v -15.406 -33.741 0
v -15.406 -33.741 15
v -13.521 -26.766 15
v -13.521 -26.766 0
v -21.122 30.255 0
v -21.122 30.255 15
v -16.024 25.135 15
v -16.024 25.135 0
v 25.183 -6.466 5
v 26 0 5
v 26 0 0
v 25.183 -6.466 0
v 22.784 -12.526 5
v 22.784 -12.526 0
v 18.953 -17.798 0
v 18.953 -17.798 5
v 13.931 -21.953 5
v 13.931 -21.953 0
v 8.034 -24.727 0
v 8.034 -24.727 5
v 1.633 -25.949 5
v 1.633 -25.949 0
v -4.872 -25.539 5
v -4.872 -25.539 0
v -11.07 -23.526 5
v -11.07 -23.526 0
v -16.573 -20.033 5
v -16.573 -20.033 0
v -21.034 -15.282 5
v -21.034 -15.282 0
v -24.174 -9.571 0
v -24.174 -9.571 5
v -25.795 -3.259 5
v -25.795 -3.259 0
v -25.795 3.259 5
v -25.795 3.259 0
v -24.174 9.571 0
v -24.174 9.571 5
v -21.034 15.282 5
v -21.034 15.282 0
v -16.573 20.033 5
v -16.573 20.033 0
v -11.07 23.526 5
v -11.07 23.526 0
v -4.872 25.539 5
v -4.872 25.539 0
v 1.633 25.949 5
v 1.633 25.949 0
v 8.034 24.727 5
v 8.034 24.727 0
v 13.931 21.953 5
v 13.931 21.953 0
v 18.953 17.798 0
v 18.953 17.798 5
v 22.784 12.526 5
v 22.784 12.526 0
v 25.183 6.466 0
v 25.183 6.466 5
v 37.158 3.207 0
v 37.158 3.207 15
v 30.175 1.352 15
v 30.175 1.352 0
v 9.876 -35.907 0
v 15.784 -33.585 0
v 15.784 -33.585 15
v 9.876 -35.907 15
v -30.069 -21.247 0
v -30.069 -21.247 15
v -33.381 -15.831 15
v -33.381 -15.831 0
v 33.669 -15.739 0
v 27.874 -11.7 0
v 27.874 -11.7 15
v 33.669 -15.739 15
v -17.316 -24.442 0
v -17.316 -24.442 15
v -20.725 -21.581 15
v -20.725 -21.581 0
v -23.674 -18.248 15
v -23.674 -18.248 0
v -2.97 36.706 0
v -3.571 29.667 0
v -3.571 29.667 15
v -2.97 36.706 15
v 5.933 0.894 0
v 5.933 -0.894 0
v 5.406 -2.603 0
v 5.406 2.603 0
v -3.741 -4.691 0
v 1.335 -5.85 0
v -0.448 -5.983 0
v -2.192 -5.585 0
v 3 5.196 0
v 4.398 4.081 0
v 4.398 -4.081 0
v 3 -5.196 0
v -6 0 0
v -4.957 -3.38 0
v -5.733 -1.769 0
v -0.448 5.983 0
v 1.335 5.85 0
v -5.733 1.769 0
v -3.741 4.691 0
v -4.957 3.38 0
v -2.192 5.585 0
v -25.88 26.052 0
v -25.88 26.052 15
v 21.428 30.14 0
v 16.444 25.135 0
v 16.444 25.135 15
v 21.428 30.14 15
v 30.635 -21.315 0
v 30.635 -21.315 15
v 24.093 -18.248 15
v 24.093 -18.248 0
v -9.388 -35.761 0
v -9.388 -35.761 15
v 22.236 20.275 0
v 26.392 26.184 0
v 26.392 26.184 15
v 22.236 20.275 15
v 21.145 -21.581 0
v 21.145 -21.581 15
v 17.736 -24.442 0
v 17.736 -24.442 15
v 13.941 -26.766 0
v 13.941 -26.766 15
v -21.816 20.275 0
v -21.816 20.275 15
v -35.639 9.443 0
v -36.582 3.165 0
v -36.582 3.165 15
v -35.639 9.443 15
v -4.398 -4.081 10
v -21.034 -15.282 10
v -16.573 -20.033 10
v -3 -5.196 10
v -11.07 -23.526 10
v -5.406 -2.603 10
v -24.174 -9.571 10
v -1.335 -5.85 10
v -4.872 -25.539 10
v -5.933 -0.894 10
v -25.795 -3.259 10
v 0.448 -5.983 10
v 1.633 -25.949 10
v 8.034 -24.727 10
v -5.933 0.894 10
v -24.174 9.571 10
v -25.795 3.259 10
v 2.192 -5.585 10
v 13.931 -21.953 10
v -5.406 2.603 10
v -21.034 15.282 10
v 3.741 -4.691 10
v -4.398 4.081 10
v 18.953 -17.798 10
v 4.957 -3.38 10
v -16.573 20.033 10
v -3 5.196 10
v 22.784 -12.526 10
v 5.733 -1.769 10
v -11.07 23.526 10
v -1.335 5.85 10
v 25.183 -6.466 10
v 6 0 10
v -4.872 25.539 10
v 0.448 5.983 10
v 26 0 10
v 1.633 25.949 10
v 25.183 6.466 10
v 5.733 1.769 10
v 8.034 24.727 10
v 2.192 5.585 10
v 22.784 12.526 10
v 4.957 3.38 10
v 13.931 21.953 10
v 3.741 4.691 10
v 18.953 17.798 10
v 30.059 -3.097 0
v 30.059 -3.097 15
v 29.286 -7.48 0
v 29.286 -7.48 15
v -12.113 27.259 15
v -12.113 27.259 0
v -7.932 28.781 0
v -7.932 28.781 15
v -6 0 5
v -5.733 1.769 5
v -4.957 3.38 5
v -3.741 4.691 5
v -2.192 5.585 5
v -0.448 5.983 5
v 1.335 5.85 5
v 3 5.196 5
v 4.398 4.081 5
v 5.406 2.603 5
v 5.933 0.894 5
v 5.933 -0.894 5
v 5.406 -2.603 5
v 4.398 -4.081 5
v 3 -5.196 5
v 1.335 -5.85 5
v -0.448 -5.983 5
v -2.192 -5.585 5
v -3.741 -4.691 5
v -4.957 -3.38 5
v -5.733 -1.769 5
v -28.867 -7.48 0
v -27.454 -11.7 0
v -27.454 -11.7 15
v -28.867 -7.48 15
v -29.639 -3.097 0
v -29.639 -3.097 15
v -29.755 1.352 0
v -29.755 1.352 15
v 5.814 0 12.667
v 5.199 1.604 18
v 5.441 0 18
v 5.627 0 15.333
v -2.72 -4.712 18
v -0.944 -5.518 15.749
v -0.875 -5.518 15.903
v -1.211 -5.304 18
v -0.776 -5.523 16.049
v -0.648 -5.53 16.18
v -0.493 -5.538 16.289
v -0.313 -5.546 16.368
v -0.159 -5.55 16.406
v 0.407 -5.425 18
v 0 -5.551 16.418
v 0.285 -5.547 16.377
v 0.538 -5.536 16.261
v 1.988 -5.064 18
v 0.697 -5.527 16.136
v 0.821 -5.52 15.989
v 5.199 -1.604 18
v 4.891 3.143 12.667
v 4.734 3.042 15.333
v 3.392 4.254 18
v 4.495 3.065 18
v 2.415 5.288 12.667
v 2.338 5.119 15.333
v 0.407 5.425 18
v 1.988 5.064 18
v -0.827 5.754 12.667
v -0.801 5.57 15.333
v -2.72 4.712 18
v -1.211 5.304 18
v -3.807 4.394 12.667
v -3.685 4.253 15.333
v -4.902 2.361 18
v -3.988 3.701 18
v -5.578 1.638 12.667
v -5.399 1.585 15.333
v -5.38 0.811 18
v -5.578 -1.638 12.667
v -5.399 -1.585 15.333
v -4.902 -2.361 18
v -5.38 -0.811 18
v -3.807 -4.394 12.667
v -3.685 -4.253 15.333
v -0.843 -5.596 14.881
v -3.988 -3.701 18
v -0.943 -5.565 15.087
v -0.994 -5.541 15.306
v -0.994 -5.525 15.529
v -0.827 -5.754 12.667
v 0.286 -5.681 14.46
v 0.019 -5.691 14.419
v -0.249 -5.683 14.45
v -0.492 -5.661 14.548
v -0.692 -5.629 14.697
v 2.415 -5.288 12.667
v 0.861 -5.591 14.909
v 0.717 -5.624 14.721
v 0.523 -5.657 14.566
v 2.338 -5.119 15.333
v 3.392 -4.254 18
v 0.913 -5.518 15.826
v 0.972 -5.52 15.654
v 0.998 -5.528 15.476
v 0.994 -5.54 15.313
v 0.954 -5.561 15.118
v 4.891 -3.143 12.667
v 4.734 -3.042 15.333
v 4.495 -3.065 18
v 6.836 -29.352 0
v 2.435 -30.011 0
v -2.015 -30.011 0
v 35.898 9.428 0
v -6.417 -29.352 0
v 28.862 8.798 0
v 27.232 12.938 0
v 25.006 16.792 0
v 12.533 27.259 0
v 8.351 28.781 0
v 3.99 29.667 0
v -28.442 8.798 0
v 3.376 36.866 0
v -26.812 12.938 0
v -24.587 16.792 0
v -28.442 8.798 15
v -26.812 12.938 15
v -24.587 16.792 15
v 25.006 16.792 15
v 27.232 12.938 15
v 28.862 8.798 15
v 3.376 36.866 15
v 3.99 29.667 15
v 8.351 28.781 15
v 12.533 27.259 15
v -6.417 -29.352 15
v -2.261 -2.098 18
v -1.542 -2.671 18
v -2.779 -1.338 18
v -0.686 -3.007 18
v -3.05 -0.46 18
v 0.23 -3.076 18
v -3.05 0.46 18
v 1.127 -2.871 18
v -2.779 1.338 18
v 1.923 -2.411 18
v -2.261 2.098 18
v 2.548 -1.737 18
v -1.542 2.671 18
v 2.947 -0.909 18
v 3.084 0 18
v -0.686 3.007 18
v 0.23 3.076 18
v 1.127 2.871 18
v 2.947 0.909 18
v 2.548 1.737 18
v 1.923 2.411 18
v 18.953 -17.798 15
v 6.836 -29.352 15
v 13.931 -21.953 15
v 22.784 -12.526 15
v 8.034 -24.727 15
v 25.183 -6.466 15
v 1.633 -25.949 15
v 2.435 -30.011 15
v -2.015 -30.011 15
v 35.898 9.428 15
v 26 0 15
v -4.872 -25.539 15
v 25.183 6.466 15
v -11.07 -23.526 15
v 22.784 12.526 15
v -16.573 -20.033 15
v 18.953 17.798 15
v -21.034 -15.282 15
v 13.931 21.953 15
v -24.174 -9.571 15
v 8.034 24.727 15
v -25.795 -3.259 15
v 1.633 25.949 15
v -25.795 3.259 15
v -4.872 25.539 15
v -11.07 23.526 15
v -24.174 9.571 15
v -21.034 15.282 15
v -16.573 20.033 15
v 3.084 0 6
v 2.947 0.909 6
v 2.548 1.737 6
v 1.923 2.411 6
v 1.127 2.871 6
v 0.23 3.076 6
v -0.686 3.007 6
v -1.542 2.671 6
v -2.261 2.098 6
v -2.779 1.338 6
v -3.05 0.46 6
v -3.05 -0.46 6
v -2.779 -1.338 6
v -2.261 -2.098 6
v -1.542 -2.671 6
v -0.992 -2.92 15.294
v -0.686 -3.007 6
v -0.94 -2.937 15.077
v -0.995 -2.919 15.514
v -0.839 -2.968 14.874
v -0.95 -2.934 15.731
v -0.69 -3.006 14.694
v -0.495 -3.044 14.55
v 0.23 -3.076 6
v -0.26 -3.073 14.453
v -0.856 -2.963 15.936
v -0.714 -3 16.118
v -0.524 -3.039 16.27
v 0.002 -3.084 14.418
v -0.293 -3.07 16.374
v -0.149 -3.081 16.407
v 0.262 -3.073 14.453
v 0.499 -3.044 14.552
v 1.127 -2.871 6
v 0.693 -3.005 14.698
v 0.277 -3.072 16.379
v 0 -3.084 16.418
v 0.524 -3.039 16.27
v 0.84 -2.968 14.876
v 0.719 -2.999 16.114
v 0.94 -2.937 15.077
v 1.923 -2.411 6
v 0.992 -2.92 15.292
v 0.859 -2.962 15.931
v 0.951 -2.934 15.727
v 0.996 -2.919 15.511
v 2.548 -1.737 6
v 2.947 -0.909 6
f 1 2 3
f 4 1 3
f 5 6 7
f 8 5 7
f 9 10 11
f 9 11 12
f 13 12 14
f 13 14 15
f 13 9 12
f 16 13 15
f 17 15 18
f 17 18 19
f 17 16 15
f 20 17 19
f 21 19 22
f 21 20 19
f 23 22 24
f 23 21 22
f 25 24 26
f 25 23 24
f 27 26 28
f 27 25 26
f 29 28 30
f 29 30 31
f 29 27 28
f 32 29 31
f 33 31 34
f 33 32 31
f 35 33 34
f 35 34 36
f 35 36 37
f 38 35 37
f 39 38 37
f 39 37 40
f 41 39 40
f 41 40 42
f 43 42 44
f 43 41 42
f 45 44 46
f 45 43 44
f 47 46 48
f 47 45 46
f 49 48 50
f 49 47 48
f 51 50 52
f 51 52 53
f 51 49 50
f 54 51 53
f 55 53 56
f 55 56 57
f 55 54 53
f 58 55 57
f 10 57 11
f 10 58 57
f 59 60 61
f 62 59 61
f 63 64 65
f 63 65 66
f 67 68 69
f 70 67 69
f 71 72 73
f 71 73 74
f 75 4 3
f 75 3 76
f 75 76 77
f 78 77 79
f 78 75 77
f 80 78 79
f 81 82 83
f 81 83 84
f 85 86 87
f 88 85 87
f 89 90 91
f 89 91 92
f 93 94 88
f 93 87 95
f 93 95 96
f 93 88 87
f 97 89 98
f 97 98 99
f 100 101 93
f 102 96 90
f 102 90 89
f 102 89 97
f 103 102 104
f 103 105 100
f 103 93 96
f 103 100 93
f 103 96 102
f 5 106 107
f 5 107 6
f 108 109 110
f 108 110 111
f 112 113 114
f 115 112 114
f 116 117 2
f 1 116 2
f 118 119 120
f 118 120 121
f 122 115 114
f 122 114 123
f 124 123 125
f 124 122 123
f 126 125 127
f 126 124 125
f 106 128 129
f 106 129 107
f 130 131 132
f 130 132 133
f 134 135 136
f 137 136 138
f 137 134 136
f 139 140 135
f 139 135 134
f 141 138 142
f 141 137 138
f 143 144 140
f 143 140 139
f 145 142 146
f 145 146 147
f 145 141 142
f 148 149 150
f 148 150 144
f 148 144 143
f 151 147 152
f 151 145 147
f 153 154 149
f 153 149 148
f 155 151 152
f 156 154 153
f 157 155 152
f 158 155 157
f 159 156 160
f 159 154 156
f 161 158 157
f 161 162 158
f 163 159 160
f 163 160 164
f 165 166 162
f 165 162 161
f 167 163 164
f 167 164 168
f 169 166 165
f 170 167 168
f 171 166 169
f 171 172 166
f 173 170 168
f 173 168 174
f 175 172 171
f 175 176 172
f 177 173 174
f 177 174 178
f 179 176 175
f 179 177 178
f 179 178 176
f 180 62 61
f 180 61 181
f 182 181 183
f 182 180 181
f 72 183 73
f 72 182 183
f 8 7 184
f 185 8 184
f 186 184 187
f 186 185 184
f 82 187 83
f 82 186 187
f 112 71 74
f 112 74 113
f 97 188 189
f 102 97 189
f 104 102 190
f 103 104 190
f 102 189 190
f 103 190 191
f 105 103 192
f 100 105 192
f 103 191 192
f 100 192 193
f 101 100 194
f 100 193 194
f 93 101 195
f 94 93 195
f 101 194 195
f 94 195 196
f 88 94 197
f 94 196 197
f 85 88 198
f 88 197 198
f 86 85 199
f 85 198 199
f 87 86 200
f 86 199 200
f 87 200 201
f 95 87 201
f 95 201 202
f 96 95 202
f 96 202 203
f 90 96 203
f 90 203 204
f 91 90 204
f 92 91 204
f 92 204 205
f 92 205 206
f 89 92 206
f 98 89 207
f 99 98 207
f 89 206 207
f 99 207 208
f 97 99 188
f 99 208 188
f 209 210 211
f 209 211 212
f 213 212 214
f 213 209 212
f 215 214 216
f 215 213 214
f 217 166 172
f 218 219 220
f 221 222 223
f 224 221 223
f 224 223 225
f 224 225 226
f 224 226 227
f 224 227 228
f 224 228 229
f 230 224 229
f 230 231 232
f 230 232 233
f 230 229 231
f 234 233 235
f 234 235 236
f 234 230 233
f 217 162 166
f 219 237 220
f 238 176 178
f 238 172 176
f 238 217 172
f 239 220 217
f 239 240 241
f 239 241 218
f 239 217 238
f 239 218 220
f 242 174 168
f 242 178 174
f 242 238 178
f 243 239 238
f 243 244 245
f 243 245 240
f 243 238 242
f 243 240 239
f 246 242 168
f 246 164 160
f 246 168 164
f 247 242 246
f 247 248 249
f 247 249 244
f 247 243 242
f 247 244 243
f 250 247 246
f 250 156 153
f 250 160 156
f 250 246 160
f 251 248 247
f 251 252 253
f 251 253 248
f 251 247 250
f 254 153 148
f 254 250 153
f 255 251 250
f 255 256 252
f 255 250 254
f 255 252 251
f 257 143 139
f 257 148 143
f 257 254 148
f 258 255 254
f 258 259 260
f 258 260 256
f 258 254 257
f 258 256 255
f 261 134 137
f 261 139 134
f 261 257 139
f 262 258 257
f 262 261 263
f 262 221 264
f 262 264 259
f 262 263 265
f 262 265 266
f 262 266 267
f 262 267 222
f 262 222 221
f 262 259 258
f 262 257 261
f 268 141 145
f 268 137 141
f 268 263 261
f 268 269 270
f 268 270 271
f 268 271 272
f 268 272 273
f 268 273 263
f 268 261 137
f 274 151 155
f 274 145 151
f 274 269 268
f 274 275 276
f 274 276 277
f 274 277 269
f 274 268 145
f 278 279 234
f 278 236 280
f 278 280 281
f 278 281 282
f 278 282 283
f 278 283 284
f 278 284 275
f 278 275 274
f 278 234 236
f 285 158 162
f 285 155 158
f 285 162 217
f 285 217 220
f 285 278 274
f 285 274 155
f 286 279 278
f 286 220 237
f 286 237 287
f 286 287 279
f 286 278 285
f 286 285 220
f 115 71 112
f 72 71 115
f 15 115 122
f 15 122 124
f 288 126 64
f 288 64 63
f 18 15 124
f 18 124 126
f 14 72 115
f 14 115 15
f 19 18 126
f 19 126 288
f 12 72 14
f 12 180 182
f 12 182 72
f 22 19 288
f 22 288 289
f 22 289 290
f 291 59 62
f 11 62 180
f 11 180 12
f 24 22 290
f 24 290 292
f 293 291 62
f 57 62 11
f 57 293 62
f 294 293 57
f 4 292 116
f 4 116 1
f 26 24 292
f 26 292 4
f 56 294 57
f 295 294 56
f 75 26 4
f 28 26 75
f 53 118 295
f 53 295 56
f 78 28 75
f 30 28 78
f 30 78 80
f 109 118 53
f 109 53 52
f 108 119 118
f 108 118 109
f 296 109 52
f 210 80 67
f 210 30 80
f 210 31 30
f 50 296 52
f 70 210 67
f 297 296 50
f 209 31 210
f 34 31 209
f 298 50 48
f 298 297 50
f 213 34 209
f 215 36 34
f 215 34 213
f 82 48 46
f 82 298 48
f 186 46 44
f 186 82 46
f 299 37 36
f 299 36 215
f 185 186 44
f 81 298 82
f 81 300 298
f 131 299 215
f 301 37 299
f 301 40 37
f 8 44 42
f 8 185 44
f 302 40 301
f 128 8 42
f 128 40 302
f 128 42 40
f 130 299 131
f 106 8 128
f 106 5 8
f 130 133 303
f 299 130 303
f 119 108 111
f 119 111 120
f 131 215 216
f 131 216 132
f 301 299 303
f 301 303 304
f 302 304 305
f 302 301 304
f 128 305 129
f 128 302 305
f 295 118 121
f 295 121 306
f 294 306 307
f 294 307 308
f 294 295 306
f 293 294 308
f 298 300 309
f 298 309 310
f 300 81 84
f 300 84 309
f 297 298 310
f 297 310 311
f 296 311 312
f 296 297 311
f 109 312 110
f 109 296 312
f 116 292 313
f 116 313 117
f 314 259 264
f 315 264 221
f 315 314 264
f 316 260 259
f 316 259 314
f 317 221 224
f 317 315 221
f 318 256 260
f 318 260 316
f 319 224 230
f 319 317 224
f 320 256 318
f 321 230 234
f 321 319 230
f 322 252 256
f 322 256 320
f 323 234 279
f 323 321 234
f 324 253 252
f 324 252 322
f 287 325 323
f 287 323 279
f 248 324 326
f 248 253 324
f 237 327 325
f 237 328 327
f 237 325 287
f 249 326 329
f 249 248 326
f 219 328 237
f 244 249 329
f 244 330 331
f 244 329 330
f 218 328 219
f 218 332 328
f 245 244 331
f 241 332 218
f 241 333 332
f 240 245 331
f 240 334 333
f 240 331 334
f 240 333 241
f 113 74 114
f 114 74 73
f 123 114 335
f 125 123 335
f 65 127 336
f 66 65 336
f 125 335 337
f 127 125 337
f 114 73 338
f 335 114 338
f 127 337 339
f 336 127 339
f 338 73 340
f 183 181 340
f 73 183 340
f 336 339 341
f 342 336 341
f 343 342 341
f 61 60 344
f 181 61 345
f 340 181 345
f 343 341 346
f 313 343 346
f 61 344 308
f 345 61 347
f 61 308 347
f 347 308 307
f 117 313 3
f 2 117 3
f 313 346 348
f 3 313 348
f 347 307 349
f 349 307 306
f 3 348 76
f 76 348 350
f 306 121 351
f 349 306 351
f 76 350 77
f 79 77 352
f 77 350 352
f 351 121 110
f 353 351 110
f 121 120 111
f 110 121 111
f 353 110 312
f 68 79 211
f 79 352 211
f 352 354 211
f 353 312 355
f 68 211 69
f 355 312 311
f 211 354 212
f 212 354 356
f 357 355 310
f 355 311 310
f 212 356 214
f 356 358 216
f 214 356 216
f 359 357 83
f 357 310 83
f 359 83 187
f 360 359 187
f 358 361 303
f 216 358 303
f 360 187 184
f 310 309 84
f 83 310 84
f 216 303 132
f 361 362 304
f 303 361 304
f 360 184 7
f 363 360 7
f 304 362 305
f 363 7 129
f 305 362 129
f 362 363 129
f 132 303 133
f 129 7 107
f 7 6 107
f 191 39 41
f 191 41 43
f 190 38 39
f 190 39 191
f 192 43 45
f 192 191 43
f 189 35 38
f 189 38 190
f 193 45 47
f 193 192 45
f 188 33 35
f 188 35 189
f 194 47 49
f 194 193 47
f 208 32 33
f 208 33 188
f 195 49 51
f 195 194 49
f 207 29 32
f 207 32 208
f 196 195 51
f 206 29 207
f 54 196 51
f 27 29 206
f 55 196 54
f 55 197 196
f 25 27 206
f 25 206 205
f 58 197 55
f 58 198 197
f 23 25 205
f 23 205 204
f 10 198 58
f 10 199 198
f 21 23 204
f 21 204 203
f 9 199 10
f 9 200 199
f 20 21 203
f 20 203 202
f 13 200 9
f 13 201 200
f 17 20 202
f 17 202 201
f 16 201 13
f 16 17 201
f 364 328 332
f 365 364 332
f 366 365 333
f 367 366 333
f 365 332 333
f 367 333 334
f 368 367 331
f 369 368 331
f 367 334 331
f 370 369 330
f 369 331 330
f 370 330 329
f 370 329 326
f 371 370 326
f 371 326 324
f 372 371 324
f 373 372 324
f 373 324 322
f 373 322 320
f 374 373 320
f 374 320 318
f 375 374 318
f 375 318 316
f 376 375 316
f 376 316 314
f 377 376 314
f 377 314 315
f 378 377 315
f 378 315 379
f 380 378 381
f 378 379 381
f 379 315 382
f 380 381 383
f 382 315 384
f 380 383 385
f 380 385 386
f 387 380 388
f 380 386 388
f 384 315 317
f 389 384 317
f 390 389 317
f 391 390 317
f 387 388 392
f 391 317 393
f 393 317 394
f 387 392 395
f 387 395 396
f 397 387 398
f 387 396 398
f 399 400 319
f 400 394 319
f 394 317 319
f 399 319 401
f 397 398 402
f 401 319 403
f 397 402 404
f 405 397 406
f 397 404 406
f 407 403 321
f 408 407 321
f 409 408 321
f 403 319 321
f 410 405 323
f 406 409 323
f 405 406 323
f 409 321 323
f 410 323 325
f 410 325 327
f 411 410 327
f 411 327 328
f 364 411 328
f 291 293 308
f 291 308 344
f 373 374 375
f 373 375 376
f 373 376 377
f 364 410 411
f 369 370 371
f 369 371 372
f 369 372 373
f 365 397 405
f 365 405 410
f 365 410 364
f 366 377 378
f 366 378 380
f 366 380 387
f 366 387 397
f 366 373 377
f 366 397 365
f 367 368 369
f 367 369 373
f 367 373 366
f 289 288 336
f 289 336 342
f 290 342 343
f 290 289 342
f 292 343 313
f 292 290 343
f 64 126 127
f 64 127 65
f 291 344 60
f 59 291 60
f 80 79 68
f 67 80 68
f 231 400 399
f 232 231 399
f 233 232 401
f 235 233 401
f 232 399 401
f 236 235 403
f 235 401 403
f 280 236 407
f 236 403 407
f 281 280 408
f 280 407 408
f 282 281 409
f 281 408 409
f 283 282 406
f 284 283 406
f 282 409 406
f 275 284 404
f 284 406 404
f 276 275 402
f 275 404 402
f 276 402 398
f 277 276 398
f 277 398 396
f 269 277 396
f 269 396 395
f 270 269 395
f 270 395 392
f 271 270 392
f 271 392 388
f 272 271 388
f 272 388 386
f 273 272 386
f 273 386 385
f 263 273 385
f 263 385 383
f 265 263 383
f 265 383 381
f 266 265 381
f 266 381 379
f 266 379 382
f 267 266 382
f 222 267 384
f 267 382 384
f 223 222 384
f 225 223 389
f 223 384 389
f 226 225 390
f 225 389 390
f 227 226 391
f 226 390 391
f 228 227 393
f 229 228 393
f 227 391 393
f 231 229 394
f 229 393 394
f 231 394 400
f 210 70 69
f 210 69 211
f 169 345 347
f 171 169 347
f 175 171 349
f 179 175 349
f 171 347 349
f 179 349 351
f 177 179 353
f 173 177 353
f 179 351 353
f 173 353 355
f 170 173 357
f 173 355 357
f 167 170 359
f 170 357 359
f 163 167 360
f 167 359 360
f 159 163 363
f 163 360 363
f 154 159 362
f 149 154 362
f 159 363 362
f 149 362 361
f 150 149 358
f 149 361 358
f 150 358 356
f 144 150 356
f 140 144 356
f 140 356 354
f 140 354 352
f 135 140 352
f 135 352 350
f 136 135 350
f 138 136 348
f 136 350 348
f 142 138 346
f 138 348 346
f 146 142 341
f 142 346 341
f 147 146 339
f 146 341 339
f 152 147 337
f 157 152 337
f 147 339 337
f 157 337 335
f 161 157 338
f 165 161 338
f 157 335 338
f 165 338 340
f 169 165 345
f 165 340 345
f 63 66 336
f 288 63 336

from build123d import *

# Parameters (mm, degrees)
BOSS_EXTRUDE1_DEPTH = 15
SKETCH3_R           = 26
CUT_EXTRUDE1_DEPTH  = 5
CUT_EXTRUDE2_START  = -5
SKETCH4_R           = 26
CUT_EXTRUDE2_DEPTH  = 5
SKETCH5_R           = 6
BOSS_EXTRUDE2_DEPTH = 8
BOSS_EXTRUDE2_TAPER = 4
SKETCH6_R           = 6
BOSS_EXTRUDE3_DEPTH = 5
SKETCH7_R           = 3.084221082
CUT_EXTRUDE3_DEPTH  = 12
CUT_EXTRUDE4_REACH  = 57.352
SKETCH8_R           = 1


with BuildPart() as part:
    # Sketch1 → Boss-Extrude1 (new body)
    with BuildSketch(Plane.XY):
        with BuildLine():
            Line((-3.570594462, 29.667493479), (-2.97005784, 36.705576615))
            Line((-2.97005784, 36.705576615), (3.376008048, 36.866330498))
            Line((3.376008048, 36.866330498), (3.990261273, 29.667493478))
            ThreePointArc((3.990261273, 29.667493478), (10.470437707, 28.097419204), (16.443765143, 25.134788755))
            Line((16.443765143, 25.134788755), (21.427795521, 30.140255732))
            Line((21.427795521, 30.140255732), (26.392494634, 26.184227828))
            Line((26.392494634, 26.184227828), (22.235716663, 20.274764369))
            ThreePointArc((22.235716663, 20.274764369), (26.190595521, 14.906640576), (28.862087666, 8.797553119))
            Line((28.862087666, 8.797553119), (35.897528594, 9.428290308))
            Line((35.897528594, 9.428290308), (37.157823041, 3.20655004))
            Line((37.157823041, 3.20655004), (30.175016484, 1.351563771))
            ThreePointArc((30.175016484, 1.351563771), (29.754065995, -5.302804758), (27.873701984, -11.699839306))
            Line((27.873701984, -11.699839306), (33.668592462, -15.738960845))
            Line((33.668592462, -15.738960845), (30.634776465, -21.315192059))
            Line((30.634776465, -21.315192059), (24.093274115, -18.247732447))
            ThreePointArc((24.093274115, -18.247732447), (19.493461691, -23.074692722), (13.941084742, -26.766430803))
            Line((13.941084742, -26.766430803), (15.783931113, -33.585461212))
            Line((15.783931113, -33.585461212), (9.875560893, -35.907002814))
            Line((9.875560893, -35.907002814), (6.8362044, -29.352395764))
            ThreePointArc((6.8362044, -29.352395764), (0.209833396, -30.093359427), (-6.416537607, -29.352395762))
            Line((-6.416537607, -29.352395762), (-9.388023643, -35.760634927))
            Line((-9.388023643, -35.760634927), (-15.406355994, -33.741211801))
            Line((-15.406355994, -33.741211801), (-13.521417949, -26.766430798))
            ThreePointArc((-13.521417949, -26.766430798), (-19.073794896, -23.074692716), (-23.673607318, -18.24773244))
            Line((-23.673607318, -18.24773244), (-30.069034419, -21.246694037))
            Line((-30.069034419, -21.246694037), (-33.381284309, -15.831216706))
            Line((-33.381284309, -15.831216706), (-27.454035185, -11.699839298))
            ThreePointArc((-27.454035185, -11.699839298), (-29.334399194, -5.302804748), (-29.755349682, 1.351563781))
            Line((-29.755349682, 1.351563781), (-36.58222643, 3.165127213))
            Line((-36.58222643, 3.165127213), (-35.638555324, 9.442696719))
            Line((-35.638555324, 9.442696719), (-28.442420861, 8.797553128))
            ThreePointArc((-28.442420861, 8.797553128), (-25.770928714, 14.906640584), (-21.816049855, 20.274764376))
            Line((-21.816049855, 20.274764376), (-25.880004748, 26.052266352))
            Line((-25.880004748, 26.052266352), (-21.121966844, 30.254583494))
            Line((-21.121966844, 30.254583494), (-16.024098333, 25.13478876))
            ThreePointArc((-16.024098333, 25.13478876), (-10.050770896, 28.097419207), (-3.570594462, 29.667493479))
        make_face()
    extrude(amount=BOSS_EXTRUDE1_DEPTH)

    # Sketch3 → Cut-Extrude1 (cut)
    with BuildSketch(Plane.XY.offset(15)):
        Circle(SKETCH3_R)
    extrude(amount=-CUT_EXTRUDE1_DEPTH, mode=Mode.SUBTRACT)

    # Sketch4 → Cut-Extrude2 (cut)
    with BuildSketch(Plane(origin=(0, 0, 0), x_dir=(-1, 0, 0), z_dir=(0, 0, -1)).offset(CUT_EXTRUDE2_START)):
        with Locations(Location((0, 0, 0), (0, 0, 180))):
            Circle(SKETCH4_R)
    extrude(amount=CUT_EXTRUDE2_DEPTH, mode=Mode.SUBTRACT)

    # Sketch5 → Boss-Extrude2 (add)
    with BuildSketch(Plane.XY.offset(10)):
        Circle(SKETCH5_R)
    extrude(amount=BOSS_EXTRUDE2_DEPTH, taper=BOSS_EXTRUDE2_TAPER)

    # Sketch6 → Boss-Extrude3 (add)
    with BuildSketch(Plane(origin=(0, 0, 5), x_dir=(-1, 0, 0), z_dir=(0, 0, -1))):
        Circle(SKETCH6_R)
    extrude(amount=BOSS_EXTRUDE3_DEPTH)

    # Sketch7 → Cut-Extrude3 (cut)
    with BuildSketch(Plane.XY.offset(18)):
        Circle(SKETCH7_R)
    extrude(amount=-CUT_EXTRUDE3_DEPTH, mode=Mode.SUBTRACT)

    # Cut-Extrude4: up to this cone (the profile starts inside it)
    cut_extrude4_end = Plane(origin=(0, 0, 15.4184), z_dir=(0, 0, -1)) * Cone(1.182636436, 10.059580688, 126.946217124, mode=Mode.PRIVATE)
    # Sketch8 → Cut-Extrude4 (cut, up to the surface)
    with BuildSketch(Plane(origin=(0, 0, 0), x_dir=(1, 0, 0), z_dir=(0, 1, 0)), mode=Mode.PRIVATE) as cut_extrude4_sk1:
        with Locations(Location((0, -15.418399821, 0), (0, 0, 270))):
            Circle(SKETCH8_R)
    cut_extrude4_tool1 = extrude(cut_extrude4_sk1.sketch, amount=-CUT_EXTRUDE4_REACH, mode=Mode.PRIVATE) & cut_extrude4_end
    add(cut_extrude4_tool1.solids().sort_by_distance((0, 0, 15.4184))[0], mode=Mode.SUBTRACT)


solid = part.part
